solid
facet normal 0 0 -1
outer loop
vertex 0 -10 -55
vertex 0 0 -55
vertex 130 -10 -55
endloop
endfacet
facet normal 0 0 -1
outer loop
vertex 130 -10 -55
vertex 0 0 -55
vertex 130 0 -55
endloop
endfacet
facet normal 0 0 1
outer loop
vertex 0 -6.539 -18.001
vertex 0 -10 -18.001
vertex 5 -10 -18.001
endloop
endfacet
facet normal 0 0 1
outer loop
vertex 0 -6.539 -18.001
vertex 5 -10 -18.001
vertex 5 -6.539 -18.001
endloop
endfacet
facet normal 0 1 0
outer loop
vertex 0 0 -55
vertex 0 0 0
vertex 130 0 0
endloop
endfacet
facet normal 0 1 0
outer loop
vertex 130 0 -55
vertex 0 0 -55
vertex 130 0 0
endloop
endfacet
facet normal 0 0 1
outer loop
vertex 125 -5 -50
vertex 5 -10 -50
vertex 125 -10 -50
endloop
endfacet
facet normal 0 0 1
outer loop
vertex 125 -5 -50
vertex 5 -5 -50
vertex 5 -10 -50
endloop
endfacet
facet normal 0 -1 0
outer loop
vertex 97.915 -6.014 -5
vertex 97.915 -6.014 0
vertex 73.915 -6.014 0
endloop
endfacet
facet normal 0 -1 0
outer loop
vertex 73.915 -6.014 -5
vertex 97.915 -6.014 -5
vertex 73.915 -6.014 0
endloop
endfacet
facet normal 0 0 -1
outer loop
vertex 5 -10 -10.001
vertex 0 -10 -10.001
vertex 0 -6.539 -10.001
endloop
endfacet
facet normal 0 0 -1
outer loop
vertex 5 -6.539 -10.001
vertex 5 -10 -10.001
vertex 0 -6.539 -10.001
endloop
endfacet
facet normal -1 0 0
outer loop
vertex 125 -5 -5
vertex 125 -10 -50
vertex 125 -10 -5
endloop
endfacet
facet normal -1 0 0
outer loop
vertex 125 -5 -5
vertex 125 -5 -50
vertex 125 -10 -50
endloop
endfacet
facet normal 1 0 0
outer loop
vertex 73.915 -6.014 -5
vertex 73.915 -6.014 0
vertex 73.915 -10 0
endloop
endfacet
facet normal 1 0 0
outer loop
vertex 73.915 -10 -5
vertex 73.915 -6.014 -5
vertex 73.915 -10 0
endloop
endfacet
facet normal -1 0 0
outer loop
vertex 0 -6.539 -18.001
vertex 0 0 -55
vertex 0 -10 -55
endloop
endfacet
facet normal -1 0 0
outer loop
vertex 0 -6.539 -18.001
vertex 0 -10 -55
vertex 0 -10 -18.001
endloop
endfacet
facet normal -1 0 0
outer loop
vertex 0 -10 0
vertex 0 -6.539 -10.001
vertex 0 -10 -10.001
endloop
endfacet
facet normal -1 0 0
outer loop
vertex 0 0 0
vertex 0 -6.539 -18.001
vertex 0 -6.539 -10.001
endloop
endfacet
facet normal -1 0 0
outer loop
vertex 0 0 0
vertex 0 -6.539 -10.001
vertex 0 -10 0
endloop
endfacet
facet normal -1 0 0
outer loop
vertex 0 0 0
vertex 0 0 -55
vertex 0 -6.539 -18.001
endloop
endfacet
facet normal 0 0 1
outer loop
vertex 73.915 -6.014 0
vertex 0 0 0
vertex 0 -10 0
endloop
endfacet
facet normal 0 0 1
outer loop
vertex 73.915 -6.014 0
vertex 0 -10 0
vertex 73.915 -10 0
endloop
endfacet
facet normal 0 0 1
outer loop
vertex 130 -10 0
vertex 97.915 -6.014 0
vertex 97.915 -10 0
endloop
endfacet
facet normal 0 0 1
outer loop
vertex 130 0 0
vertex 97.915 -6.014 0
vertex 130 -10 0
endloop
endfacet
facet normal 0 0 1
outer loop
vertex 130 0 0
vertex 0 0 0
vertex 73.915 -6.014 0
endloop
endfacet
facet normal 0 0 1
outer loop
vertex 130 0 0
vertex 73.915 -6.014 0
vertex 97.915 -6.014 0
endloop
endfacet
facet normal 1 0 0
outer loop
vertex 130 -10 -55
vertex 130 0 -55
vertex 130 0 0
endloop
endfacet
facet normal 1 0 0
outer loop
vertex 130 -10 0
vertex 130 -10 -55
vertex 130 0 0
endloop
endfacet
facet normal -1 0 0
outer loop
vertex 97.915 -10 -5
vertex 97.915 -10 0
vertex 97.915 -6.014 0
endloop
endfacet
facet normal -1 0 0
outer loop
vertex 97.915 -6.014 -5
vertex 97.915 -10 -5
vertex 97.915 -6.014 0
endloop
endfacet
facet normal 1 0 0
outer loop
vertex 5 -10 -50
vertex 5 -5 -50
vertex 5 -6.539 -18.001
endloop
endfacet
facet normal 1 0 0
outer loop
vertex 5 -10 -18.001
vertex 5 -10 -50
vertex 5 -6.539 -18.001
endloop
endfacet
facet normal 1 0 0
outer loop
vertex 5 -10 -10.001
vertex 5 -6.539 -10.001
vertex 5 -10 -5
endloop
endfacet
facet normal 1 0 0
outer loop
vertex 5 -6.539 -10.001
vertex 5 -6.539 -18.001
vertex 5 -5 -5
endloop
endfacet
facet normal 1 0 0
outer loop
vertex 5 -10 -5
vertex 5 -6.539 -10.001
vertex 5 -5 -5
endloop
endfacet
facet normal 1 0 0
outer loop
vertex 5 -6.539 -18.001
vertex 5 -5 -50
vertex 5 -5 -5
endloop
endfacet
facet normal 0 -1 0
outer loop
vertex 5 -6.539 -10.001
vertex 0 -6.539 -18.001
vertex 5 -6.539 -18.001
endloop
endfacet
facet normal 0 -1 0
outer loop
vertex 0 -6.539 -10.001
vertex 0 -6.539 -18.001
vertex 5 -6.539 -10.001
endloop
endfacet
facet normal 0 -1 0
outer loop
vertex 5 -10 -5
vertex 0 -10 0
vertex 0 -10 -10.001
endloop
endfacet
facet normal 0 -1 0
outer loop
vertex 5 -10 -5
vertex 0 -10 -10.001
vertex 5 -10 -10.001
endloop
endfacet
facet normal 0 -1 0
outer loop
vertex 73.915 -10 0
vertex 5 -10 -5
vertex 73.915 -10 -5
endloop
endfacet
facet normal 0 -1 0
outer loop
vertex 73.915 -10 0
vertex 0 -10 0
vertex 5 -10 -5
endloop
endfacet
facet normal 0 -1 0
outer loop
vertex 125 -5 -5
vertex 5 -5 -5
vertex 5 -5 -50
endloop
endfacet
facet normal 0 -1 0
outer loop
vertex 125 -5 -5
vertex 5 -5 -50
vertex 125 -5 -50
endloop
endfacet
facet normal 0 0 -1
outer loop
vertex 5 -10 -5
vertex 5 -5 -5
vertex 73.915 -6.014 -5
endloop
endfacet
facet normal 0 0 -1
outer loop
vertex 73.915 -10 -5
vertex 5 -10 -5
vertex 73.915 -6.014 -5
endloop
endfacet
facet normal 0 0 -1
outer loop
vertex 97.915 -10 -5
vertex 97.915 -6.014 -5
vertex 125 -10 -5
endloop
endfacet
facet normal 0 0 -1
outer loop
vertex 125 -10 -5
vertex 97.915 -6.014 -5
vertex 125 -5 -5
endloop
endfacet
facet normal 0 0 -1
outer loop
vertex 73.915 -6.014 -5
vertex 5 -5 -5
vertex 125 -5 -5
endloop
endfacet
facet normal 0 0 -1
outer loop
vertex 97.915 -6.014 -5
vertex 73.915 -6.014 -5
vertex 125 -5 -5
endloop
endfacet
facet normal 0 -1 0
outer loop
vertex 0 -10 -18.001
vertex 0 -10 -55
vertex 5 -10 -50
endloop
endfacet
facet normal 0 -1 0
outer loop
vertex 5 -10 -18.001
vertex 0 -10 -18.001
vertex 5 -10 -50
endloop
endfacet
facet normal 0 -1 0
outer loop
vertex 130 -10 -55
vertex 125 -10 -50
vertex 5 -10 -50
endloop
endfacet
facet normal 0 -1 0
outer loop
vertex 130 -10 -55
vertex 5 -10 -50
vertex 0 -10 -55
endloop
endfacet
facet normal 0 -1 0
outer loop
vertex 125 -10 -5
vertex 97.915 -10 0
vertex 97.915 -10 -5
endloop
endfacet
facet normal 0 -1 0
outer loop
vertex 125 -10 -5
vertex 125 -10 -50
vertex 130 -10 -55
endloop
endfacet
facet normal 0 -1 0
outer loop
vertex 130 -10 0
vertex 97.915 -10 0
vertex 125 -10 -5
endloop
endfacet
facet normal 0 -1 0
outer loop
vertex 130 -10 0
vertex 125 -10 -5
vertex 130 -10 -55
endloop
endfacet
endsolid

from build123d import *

# Parameters (mm, degrees)
F0_W     = 130
F0_H     = 55
F1_DEPTH = 10
F2_T     = -5
F4_DEPTH = 11.684
F5_W     = 3.5
F5_H     = 8
F6_DEPTH = 6.7818


with BuildPart() as f1:
    # F0 (on Front) → F1 (new body)
    with BuildSketch(Plane.XZ):
        with Locations((65, -27.5)):
            Rectangle(F0_W, F0_H)
    extrude(amount=F1_DEPTH)

    # F2
    f2_openings = [f1.faces().sort_by_distance(p)[0] for p in [
        (65, -10, -27.5),
    ]]
    offset(amount=F2_T, openings=f2_openings)

    # F3 (on Top) → F4 (cut)
    with BuildSketch(Plane.XY):
        Polygon((73.914569, -6.014053), (73.914569, -10.014053), (97.914569, -10.014053), (97.914569, -9.998512), (97.914569, -6.014053), align=None)
    extrude(amount=-F4_DEPTH, mode=Mode.SUBTRACT)

    # F5 (on Right) → F6 (cut)
    with BuildSketch(Plane.YZ):
        with Locations((-8.289312, -14.001081)):
            Rectangle(F5_W, F5_H)
    extrude(amount=F6_DEPTH, mode=Mode.SUBTRACT)


solid = f1.part
